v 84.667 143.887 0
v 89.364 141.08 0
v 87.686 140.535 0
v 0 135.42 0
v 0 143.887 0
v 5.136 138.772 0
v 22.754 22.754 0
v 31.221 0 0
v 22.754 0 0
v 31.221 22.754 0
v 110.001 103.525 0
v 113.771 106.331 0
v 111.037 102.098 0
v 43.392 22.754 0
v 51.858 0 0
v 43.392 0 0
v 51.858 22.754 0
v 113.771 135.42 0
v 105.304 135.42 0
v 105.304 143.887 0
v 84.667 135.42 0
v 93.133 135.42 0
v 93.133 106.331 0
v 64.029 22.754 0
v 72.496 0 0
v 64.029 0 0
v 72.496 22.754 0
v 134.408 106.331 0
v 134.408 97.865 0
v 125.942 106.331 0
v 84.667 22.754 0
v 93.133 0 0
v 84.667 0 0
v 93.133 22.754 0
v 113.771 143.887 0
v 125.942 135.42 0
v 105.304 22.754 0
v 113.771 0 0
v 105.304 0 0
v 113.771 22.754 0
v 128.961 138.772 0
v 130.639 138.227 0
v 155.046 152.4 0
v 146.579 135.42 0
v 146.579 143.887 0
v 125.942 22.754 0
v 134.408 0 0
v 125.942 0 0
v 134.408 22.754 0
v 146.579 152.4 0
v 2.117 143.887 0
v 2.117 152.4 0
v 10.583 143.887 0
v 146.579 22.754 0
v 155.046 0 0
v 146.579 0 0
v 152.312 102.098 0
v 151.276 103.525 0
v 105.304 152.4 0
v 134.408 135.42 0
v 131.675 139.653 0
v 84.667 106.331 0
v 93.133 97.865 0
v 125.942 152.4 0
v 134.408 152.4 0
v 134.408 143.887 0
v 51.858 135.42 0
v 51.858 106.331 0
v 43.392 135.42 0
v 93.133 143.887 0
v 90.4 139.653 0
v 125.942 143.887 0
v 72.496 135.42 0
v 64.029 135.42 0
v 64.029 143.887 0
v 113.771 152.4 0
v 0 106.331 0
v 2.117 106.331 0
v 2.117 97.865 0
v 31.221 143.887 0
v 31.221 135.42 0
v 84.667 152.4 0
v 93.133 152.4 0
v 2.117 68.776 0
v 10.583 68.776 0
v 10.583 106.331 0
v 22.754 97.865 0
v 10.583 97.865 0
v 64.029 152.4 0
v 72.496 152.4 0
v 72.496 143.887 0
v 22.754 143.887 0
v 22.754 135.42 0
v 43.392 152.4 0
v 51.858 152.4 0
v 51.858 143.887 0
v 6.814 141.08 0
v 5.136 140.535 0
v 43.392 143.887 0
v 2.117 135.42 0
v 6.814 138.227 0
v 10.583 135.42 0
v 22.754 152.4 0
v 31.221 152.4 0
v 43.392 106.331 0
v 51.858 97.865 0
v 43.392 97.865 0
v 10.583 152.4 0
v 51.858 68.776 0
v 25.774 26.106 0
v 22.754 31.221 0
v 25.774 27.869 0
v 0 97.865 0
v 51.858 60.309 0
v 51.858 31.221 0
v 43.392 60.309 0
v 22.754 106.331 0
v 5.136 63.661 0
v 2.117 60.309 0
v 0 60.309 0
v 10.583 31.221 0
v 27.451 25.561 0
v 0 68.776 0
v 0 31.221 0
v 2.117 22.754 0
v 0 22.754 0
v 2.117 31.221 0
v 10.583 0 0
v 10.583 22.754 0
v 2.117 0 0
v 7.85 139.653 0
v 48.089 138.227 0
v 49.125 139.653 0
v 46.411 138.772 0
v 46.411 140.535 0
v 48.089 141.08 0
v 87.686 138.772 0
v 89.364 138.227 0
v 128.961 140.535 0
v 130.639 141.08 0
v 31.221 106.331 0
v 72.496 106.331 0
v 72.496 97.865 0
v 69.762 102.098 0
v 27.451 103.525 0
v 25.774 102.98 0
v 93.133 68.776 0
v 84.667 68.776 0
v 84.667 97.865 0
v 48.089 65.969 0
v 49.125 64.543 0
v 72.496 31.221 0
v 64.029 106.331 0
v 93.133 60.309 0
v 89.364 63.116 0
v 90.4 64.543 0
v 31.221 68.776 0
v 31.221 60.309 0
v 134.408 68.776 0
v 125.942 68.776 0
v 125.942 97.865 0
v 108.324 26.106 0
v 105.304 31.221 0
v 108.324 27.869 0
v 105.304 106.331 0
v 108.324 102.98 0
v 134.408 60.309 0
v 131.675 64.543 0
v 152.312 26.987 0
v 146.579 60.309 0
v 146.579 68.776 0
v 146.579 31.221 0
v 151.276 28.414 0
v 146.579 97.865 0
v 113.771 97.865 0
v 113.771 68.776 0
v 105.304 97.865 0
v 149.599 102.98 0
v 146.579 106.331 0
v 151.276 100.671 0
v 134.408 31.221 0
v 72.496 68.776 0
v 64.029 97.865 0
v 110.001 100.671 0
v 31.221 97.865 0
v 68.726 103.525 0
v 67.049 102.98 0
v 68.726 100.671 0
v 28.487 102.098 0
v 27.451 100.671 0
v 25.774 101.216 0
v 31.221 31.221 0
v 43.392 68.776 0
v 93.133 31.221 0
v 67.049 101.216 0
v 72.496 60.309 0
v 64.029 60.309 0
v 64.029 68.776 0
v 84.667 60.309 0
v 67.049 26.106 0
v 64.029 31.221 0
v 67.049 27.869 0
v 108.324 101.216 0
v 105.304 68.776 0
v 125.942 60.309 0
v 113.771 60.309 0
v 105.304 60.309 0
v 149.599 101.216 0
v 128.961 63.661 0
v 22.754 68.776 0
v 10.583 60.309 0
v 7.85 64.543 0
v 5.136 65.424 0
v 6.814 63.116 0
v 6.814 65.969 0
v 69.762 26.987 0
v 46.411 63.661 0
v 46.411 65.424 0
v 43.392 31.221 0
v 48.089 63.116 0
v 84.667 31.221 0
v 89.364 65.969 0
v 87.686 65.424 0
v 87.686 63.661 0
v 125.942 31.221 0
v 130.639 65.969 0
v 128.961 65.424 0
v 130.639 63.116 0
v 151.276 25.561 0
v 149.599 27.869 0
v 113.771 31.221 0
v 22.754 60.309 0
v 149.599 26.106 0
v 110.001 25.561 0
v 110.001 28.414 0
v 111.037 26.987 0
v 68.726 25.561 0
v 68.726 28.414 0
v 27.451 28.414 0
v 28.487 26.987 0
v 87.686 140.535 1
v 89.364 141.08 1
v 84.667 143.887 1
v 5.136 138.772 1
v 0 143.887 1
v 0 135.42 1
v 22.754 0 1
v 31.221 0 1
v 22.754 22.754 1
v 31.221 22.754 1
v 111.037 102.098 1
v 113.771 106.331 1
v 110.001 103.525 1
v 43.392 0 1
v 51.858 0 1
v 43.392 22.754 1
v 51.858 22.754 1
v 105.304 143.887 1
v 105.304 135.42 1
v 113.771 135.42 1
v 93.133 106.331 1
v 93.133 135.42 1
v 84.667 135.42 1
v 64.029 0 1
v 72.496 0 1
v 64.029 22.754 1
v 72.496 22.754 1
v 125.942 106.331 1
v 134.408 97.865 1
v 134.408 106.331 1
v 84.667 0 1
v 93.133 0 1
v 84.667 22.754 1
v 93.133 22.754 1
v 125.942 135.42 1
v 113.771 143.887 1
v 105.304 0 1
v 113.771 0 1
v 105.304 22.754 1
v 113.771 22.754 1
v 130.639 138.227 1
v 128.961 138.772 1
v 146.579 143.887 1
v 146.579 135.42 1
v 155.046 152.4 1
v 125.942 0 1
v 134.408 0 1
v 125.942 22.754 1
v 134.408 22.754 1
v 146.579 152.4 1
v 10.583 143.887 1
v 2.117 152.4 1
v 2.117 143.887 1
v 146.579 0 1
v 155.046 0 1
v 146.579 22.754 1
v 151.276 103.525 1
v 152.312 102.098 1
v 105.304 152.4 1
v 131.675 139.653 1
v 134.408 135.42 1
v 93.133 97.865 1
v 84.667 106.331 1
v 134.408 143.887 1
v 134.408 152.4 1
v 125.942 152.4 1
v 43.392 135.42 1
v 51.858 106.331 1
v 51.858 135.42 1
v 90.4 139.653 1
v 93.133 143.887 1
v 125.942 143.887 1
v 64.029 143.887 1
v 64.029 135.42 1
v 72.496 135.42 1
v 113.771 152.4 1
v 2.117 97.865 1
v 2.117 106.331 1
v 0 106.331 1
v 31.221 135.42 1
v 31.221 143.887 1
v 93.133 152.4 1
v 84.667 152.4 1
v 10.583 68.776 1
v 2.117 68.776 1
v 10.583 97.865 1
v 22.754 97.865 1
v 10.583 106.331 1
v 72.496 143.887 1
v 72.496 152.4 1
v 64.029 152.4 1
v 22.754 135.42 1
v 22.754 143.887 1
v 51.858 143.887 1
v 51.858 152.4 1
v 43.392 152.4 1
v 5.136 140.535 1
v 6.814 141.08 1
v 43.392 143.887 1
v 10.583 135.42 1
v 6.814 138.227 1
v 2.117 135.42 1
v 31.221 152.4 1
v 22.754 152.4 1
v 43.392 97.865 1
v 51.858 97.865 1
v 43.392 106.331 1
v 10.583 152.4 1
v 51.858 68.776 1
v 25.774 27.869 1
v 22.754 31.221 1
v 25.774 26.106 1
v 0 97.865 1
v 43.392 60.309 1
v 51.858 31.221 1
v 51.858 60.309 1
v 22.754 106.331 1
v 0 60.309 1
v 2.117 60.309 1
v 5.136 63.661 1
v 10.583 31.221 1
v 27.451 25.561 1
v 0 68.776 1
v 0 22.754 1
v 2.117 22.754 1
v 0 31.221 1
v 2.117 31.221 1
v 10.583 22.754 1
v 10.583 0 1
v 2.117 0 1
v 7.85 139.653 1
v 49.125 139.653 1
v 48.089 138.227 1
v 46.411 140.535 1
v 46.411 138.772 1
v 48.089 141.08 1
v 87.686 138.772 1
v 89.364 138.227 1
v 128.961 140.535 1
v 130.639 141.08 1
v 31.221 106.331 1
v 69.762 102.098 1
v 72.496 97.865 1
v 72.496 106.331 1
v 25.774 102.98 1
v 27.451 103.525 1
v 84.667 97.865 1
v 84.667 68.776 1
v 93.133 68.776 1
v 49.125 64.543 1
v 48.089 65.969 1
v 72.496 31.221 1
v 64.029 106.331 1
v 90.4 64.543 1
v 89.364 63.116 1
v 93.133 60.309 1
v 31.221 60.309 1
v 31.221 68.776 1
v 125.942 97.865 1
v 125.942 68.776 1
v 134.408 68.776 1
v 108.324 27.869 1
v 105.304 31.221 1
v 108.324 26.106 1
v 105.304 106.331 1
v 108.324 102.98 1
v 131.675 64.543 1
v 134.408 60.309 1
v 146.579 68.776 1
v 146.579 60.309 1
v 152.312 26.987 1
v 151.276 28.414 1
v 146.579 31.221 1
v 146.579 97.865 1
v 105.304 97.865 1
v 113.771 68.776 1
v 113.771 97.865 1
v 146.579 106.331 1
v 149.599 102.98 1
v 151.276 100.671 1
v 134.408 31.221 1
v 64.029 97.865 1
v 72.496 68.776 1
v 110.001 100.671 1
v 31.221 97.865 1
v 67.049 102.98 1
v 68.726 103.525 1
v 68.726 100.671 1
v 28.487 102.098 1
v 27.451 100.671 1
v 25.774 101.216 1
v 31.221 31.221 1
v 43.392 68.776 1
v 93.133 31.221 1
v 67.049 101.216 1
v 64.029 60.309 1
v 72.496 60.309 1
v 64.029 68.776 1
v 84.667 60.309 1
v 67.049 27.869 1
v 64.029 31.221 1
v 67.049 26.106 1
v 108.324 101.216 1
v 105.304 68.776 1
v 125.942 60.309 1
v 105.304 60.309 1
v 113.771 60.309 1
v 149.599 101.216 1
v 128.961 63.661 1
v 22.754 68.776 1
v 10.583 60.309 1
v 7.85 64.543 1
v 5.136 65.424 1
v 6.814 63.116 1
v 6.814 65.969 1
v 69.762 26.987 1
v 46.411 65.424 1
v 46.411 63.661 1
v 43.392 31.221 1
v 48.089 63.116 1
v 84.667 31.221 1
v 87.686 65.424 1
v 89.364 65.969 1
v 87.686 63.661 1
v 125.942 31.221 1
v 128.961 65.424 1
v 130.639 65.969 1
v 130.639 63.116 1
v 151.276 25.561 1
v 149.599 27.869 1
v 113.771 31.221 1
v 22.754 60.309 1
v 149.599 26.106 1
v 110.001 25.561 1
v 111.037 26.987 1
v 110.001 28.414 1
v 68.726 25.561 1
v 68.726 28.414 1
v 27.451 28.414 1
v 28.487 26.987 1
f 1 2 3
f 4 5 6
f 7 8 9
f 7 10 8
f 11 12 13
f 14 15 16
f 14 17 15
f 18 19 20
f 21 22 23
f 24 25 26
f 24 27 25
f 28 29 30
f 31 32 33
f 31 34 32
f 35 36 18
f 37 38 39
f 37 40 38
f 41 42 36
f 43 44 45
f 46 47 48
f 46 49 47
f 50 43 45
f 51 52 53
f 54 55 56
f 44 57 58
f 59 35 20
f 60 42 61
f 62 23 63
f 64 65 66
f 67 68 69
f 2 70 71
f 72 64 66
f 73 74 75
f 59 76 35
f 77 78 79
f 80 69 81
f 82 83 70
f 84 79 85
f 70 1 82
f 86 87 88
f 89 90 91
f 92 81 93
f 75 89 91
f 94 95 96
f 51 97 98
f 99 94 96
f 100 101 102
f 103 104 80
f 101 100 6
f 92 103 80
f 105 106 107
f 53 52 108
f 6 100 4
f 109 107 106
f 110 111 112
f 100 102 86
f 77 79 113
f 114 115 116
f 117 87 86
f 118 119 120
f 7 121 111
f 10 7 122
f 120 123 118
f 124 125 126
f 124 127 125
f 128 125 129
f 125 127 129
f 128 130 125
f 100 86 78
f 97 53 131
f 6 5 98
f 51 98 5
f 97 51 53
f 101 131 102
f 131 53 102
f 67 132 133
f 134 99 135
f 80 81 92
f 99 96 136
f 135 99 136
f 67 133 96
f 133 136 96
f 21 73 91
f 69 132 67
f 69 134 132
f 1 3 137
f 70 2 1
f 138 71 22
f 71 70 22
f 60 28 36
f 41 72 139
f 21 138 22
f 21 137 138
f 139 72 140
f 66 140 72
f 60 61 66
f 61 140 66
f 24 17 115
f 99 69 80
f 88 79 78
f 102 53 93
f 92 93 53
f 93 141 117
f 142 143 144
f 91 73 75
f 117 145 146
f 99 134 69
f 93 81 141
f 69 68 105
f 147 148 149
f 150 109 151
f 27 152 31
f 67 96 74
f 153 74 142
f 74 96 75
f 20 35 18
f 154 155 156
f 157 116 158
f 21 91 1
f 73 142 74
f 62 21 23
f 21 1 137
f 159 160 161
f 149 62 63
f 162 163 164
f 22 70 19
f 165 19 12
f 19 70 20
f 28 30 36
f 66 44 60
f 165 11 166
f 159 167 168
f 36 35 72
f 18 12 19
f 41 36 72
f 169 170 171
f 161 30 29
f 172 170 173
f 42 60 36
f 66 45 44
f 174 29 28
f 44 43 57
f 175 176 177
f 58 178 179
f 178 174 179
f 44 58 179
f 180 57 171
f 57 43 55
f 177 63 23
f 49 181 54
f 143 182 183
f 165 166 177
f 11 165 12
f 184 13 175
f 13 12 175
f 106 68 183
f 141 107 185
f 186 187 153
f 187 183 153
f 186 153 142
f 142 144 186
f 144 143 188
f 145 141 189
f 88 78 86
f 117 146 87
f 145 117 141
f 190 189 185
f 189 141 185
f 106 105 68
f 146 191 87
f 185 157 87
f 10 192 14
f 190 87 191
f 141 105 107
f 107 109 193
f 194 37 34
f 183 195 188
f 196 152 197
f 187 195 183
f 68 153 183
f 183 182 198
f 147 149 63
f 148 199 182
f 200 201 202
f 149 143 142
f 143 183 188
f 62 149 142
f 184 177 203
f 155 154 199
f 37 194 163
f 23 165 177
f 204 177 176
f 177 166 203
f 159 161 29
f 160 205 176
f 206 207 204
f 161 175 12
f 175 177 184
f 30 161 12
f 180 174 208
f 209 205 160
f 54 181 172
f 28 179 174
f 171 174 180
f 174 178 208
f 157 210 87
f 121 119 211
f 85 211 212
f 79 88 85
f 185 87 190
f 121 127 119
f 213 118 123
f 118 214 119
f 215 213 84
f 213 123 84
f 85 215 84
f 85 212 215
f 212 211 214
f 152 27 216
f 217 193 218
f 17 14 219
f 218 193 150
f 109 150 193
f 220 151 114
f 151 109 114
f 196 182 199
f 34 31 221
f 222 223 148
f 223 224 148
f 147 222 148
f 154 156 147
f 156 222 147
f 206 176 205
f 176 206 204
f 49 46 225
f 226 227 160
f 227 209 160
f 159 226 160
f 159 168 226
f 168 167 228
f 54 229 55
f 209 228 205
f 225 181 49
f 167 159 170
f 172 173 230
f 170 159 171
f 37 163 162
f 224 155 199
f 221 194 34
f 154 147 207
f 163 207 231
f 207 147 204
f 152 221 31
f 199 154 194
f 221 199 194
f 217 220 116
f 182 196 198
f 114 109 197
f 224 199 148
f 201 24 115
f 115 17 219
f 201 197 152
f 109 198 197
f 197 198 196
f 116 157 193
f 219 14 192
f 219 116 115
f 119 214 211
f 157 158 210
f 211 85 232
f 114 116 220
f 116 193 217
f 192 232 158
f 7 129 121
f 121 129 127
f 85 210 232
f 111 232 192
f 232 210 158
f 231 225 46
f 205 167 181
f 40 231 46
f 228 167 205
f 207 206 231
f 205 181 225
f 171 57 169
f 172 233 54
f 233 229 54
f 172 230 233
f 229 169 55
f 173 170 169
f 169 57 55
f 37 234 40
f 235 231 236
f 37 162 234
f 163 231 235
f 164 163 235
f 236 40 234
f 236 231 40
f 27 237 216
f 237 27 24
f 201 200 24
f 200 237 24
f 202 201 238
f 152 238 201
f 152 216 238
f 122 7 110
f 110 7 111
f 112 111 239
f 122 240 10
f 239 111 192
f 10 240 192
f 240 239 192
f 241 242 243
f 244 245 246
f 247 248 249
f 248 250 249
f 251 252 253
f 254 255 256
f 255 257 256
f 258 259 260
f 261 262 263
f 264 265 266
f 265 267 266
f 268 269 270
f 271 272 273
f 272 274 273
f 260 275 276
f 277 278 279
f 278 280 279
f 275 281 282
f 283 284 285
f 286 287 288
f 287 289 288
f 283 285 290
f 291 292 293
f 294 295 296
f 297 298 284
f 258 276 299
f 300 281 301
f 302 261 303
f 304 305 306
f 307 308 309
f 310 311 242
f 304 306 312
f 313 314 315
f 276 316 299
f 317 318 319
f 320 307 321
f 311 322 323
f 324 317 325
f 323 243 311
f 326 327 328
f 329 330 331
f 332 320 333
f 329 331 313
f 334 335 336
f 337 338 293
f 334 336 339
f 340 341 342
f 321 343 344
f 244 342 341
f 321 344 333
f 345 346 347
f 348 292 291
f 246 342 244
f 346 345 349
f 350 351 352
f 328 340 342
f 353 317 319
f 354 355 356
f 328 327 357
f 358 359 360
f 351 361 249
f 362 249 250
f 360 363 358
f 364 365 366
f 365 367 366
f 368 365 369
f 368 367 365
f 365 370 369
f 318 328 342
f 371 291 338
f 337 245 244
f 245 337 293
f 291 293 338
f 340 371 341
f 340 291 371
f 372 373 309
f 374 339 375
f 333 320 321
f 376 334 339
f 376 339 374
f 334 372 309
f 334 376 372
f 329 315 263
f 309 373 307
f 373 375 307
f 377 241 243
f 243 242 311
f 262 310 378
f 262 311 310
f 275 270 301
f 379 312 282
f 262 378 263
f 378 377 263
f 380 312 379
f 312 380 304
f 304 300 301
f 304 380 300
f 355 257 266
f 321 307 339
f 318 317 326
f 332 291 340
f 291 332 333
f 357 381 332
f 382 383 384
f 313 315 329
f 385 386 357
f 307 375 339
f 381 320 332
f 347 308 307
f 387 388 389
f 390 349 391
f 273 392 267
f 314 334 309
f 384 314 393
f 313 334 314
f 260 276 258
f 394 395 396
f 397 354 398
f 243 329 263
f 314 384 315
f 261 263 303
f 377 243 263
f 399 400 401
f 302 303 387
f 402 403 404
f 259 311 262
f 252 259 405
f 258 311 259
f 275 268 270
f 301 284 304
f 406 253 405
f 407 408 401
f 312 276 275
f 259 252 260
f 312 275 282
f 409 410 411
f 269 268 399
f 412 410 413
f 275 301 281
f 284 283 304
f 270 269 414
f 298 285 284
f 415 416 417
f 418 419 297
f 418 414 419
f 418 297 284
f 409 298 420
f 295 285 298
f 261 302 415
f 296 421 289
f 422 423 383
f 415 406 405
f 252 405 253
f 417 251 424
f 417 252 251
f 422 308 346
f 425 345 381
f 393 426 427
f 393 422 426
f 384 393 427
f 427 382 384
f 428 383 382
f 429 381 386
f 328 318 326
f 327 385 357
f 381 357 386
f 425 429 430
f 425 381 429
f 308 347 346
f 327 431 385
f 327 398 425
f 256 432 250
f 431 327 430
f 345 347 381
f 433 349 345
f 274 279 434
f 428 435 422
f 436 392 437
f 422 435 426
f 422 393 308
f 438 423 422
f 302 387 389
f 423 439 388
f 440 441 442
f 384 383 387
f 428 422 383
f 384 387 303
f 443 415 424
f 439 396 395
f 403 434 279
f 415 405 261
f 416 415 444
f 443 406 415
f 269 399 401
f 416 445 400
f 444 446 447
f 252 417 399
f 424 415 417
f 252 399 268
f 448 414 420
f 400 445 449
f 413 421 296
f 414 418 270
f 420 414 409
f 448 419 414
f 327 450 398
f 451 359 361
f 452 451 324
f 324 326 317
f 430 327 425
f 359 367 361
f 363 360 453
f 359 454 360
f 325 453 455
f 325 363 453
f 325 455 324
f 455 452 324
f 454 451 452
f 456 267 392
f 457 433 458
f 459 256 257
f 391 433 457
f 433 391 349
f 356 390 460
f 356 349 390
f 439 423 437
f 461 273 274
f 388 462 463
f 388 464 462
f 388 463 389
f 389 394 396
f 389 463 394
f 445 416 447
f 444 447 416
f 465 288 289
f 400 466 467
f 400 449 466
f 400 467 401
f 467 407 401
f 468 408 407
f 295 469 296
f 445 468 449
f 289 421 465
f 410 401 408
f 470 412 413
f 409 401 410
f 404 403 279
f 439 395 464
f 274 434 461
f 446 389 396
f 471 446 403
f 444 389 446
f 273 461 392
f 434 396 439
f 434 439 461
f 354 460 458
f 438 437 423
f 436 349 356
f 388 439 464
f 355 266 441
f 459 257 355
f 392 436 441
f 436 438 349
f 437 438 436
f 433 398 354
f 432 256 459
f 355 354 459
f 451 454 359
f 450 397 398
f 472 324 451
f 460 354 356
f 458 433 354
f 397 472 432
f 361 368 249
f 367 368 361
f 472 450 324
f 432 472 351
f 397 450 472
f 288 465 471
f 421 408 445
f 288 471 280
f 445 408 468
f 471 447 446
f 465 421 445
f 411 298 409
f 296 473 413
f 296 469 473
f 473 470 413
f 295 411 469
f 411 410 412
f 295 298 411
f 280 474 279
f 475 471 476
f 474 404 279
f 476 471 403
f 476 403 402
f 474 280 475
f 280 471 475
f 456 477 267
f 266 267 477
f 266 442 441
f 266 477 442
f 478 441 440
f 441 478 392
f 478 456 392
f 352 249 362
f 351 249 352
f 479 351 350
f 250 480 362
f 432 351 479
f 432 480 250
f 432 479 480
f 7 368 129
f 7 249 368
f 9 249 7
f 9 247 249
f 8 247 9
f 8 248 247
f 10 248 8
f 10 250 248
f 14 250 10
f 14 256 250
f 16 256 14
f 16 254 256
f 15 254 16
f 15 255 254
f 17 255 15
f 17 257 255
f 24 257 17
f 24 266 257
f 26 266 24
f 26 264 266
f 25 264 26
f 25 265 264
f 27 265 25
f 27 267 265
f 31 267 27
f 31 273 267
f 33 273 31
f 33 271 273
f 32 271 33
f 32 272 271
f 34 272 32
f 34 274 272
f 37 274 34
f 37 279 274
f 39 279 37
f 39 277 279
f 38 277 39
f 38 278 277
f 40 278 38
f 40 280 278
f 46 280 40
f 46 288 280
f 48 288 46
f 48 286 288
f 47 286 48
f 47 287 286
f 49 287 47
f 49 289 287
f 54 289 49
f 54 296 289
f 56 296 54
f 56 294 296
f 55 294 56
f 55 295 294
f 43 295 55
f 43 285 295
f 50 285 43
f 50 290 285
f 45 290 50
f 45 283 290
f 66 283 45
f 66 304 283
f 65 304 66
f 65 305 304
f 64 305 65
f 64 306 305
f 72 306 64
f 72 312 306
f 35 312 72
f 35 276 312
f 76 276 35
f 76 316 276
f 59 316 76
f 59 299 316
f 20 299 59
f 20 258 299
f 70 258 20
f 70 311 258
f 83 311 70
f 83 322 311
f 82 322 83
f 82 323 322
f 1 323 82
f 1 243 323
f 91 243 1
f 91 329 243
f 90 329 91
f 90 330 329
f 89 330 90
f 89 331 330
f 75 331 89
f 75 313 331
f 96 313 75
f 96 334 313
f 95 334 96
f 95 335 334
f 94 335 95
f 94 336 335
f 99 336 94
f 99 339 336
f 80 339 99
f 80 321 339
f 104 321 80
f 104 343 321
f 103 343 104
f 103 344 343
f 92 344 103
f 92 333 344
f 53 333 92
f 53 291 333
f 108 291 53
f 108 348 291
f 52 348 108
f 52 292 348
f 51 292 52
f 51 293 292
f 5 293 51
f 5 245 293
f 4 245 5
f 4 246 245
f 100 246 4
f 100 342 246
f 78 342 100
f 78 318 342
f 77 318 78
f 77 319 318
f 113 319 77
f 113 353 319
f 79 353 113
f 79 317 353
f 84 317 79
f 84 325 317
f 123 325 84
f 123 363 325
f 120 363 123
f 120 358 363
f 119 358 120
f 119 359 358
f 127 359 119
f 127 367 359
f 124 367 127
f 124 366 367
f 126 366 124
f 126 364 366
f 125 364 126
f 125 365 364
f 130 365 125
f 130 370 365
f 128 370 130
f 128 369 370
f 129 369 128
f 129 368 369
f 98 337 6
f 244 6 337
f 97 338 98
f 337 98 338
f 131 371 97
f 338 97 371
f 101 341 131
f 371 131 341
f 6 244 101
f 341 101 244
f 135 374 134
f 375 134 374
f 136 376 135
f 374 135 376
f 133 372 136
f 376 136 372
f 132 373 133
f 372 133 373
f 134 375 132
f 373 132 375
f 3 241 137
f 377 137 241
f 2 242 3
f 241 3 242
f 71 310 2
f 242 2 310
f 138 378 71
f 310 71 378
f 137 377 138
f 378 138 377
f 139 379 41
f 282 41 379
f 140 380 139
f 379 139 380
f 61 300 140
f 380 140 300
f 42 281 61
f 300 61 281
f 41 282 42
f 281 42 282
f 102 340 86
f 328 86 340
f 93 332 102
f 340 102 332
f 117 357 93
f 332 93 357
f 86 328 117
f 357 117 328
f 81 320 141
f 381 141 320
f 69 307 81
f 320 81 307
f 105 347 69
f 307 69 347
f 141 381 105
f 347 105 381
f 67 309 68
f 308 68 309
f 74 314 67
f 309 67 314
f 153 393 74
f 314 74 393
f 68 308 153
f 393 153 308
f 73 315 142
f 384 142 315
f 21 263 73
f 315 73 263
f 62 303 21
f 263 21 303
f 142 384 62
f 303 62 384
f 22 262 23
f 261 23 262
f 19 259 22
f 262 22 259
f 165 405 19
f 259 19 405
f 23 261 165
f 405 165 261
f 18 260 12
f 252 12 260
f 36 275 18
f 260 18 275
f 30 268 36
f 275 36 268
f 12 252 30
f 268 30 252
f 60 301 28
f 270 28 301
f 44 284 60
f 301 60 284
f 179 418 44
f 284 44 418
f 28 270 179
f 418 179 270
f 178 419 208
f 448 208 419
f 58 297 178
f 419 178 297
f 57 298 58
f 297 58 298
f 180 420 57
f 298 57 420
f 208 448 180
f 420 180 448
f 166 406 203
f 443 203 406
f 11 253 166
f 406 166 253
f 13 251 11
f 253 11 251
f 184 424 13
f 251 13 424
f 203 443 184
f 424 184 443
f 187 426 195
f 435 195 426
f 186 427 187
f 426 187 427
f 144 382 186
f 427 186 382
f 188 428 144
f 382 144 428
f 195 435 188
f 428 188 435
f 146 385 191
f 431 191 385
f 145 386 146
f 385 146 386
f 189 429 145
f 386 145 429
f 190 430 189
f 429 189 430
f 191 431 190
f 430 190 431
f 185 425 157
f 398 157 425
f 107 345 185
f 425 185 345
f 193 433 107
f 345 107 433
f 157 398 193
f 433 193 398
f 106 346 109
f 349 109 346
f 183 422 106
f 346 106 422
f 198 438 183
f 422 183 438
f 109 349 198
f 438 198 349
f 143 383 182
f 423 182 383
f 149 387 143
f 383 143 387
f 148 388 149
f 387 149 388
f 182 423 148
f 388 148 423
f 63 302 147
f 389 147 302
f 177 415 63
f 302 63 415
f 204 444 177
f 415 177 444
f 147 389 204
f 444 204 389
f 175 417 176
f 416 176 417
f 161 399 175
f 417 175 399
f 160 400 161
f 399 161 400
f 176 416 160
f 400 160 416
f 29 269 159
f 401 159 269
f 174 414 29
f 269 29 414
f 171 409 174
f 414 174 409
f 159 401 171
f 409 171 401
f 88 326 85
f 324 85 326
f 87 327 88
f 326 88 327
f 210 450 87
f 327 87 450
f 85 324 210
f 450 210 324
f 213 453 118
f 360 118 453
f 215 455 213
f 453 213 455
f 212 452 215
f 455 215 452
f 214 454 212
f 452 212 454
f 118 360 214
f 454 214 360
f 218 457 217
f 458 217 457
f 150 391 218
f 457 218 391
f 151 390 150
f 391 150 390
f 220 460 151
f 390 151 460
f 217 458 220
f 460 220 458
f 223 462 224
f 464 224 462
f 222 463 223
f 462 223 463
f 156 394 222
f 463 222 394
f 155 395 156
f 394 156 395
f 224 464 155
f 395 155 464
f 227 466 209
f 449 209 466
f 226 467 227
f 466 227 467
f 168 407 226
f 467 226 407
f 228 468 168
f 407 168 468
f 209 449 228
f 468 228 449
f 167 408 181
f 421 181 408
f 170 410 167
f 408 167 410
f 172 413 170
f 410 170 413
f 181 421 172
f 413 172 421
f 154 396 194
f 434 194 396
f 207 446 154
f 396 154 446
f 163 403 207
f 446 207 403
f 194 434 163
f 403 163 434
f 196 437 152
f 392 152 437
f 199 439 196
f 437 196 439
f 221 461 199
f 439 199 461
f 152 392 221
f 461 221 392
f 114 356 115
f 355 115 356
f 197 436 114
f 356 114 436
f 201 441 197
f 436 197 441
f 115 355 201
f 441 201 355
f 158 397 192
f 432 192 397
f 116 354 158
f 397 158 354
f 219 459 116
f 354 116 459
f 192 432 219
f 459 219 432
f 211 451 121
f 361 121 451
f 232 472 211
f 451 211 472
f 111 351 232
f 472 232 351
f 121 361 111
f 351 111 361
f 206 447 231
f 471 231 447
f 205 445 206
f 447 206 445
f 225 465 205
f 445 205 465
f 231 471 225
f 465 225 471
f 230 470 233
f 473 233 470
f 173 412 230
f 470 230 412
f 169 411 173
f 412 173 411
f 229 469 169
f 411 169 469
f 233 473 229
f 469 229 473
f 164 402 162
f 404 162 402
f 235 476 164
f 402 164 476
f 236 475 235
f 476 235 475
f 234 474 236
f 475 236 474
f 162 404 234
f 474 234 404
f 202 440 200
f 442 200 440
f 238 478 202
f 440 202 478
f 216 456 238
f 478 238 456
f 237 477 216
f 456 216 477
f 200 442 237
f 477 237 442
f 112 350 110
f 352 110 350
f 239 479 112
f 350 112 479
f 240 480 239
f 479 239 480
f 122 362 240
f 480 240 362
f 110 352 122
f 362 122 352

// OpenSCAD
//Giant LiteBrite offset grid, distance from holes is 1/2.
// Defined in mm but, set for Imperial

//*******  Setup  *******
//Template Size
templateSizeX = 152.4; // 6" 
//templateSizeX = 609.6; // 2'
templateSizeY = 152.4; // 6"
//templateSizeY = 1219.2; // 4'
templateThickness = 1.0; 
stripSize = 25.4/3; // 1/3"
//stripSize = 4;

//HoleSize and Spacing
holeSize = 28.575;  // 1-1/8" 
penHoleSize = 3; // 2mm for sharpie
xSpacing = 12.7; // 1/2"
offsetSpacing = 12.7;  //Distance from the holes in the next row (think 45 degree angle). 1/2"

//***********************


ySpacing = offsetSpacing*sin(45); 

//On Center Intervals
startingX = xSpacing + holeSize/2;
intervalX = xSpacing + holeSize;
//offsetStartingX = xSpacing + holeSize/2;
offsetStartingX = -(holeSize/2);

startingY = offsetSpacing + holeSize/2;
shortIntervalY = ySpacing + holeSize;
normIntervalY = offsetSpacing + holeSize;





linear_extrude(height = templateThickness)
{
	difference()
	{
		//square([templateSizeX,templateSizeY]);
        union()
        {
            //big grid of strips for support
            
            //Horizontal
            for(y = [(startingY-stripSize/2):(shortIntervalY*2):templateSizeY])
            {
				translate([0,y])square([templateSizeY,stripSize]);
            }
            for(y = [(startingY+shortIntervalY-stripSize/2):(shortIntervalY*2):templateSizeY])
            {
                translate([0,y])square([templateSizeY,stripSize]);
            }
            
            //Vertical
            for(x = [(startingX-stripSize/2):intervalX:templateSizeX])
			{
                translate([x,0])square([stripSize,templateSizeX]);
            }
            for(x = [(offsetStartingX+intervalX/2-stripSize/2):intervalX:templateSizeX])
            {
                translate([x,0])square([stripSize,templateSizeX]);
            }
        }    
    
    
        
        //echo("Normal Rows");
		for(y = [startingY:(shortIntervalY*2):templateSizeY])
        {
            for(x = [startingX:intervalX:templateSizeX])
				{translate([x,y])circle(d=penHoleSize);}
            //echo(y);
        }
        
        //echo("Offset Rows");
		for(y = [(startingY+shortIntervalY):(shortIntervalY*2):templateSizeY])
        {
            for(x = [offsetStartingX+(intervalX/2):intervalX:templateSizeX])
                   {translate([x,y])circle(d=penHoleSize);}
            //echo(y);
        }	
	}

}
	
